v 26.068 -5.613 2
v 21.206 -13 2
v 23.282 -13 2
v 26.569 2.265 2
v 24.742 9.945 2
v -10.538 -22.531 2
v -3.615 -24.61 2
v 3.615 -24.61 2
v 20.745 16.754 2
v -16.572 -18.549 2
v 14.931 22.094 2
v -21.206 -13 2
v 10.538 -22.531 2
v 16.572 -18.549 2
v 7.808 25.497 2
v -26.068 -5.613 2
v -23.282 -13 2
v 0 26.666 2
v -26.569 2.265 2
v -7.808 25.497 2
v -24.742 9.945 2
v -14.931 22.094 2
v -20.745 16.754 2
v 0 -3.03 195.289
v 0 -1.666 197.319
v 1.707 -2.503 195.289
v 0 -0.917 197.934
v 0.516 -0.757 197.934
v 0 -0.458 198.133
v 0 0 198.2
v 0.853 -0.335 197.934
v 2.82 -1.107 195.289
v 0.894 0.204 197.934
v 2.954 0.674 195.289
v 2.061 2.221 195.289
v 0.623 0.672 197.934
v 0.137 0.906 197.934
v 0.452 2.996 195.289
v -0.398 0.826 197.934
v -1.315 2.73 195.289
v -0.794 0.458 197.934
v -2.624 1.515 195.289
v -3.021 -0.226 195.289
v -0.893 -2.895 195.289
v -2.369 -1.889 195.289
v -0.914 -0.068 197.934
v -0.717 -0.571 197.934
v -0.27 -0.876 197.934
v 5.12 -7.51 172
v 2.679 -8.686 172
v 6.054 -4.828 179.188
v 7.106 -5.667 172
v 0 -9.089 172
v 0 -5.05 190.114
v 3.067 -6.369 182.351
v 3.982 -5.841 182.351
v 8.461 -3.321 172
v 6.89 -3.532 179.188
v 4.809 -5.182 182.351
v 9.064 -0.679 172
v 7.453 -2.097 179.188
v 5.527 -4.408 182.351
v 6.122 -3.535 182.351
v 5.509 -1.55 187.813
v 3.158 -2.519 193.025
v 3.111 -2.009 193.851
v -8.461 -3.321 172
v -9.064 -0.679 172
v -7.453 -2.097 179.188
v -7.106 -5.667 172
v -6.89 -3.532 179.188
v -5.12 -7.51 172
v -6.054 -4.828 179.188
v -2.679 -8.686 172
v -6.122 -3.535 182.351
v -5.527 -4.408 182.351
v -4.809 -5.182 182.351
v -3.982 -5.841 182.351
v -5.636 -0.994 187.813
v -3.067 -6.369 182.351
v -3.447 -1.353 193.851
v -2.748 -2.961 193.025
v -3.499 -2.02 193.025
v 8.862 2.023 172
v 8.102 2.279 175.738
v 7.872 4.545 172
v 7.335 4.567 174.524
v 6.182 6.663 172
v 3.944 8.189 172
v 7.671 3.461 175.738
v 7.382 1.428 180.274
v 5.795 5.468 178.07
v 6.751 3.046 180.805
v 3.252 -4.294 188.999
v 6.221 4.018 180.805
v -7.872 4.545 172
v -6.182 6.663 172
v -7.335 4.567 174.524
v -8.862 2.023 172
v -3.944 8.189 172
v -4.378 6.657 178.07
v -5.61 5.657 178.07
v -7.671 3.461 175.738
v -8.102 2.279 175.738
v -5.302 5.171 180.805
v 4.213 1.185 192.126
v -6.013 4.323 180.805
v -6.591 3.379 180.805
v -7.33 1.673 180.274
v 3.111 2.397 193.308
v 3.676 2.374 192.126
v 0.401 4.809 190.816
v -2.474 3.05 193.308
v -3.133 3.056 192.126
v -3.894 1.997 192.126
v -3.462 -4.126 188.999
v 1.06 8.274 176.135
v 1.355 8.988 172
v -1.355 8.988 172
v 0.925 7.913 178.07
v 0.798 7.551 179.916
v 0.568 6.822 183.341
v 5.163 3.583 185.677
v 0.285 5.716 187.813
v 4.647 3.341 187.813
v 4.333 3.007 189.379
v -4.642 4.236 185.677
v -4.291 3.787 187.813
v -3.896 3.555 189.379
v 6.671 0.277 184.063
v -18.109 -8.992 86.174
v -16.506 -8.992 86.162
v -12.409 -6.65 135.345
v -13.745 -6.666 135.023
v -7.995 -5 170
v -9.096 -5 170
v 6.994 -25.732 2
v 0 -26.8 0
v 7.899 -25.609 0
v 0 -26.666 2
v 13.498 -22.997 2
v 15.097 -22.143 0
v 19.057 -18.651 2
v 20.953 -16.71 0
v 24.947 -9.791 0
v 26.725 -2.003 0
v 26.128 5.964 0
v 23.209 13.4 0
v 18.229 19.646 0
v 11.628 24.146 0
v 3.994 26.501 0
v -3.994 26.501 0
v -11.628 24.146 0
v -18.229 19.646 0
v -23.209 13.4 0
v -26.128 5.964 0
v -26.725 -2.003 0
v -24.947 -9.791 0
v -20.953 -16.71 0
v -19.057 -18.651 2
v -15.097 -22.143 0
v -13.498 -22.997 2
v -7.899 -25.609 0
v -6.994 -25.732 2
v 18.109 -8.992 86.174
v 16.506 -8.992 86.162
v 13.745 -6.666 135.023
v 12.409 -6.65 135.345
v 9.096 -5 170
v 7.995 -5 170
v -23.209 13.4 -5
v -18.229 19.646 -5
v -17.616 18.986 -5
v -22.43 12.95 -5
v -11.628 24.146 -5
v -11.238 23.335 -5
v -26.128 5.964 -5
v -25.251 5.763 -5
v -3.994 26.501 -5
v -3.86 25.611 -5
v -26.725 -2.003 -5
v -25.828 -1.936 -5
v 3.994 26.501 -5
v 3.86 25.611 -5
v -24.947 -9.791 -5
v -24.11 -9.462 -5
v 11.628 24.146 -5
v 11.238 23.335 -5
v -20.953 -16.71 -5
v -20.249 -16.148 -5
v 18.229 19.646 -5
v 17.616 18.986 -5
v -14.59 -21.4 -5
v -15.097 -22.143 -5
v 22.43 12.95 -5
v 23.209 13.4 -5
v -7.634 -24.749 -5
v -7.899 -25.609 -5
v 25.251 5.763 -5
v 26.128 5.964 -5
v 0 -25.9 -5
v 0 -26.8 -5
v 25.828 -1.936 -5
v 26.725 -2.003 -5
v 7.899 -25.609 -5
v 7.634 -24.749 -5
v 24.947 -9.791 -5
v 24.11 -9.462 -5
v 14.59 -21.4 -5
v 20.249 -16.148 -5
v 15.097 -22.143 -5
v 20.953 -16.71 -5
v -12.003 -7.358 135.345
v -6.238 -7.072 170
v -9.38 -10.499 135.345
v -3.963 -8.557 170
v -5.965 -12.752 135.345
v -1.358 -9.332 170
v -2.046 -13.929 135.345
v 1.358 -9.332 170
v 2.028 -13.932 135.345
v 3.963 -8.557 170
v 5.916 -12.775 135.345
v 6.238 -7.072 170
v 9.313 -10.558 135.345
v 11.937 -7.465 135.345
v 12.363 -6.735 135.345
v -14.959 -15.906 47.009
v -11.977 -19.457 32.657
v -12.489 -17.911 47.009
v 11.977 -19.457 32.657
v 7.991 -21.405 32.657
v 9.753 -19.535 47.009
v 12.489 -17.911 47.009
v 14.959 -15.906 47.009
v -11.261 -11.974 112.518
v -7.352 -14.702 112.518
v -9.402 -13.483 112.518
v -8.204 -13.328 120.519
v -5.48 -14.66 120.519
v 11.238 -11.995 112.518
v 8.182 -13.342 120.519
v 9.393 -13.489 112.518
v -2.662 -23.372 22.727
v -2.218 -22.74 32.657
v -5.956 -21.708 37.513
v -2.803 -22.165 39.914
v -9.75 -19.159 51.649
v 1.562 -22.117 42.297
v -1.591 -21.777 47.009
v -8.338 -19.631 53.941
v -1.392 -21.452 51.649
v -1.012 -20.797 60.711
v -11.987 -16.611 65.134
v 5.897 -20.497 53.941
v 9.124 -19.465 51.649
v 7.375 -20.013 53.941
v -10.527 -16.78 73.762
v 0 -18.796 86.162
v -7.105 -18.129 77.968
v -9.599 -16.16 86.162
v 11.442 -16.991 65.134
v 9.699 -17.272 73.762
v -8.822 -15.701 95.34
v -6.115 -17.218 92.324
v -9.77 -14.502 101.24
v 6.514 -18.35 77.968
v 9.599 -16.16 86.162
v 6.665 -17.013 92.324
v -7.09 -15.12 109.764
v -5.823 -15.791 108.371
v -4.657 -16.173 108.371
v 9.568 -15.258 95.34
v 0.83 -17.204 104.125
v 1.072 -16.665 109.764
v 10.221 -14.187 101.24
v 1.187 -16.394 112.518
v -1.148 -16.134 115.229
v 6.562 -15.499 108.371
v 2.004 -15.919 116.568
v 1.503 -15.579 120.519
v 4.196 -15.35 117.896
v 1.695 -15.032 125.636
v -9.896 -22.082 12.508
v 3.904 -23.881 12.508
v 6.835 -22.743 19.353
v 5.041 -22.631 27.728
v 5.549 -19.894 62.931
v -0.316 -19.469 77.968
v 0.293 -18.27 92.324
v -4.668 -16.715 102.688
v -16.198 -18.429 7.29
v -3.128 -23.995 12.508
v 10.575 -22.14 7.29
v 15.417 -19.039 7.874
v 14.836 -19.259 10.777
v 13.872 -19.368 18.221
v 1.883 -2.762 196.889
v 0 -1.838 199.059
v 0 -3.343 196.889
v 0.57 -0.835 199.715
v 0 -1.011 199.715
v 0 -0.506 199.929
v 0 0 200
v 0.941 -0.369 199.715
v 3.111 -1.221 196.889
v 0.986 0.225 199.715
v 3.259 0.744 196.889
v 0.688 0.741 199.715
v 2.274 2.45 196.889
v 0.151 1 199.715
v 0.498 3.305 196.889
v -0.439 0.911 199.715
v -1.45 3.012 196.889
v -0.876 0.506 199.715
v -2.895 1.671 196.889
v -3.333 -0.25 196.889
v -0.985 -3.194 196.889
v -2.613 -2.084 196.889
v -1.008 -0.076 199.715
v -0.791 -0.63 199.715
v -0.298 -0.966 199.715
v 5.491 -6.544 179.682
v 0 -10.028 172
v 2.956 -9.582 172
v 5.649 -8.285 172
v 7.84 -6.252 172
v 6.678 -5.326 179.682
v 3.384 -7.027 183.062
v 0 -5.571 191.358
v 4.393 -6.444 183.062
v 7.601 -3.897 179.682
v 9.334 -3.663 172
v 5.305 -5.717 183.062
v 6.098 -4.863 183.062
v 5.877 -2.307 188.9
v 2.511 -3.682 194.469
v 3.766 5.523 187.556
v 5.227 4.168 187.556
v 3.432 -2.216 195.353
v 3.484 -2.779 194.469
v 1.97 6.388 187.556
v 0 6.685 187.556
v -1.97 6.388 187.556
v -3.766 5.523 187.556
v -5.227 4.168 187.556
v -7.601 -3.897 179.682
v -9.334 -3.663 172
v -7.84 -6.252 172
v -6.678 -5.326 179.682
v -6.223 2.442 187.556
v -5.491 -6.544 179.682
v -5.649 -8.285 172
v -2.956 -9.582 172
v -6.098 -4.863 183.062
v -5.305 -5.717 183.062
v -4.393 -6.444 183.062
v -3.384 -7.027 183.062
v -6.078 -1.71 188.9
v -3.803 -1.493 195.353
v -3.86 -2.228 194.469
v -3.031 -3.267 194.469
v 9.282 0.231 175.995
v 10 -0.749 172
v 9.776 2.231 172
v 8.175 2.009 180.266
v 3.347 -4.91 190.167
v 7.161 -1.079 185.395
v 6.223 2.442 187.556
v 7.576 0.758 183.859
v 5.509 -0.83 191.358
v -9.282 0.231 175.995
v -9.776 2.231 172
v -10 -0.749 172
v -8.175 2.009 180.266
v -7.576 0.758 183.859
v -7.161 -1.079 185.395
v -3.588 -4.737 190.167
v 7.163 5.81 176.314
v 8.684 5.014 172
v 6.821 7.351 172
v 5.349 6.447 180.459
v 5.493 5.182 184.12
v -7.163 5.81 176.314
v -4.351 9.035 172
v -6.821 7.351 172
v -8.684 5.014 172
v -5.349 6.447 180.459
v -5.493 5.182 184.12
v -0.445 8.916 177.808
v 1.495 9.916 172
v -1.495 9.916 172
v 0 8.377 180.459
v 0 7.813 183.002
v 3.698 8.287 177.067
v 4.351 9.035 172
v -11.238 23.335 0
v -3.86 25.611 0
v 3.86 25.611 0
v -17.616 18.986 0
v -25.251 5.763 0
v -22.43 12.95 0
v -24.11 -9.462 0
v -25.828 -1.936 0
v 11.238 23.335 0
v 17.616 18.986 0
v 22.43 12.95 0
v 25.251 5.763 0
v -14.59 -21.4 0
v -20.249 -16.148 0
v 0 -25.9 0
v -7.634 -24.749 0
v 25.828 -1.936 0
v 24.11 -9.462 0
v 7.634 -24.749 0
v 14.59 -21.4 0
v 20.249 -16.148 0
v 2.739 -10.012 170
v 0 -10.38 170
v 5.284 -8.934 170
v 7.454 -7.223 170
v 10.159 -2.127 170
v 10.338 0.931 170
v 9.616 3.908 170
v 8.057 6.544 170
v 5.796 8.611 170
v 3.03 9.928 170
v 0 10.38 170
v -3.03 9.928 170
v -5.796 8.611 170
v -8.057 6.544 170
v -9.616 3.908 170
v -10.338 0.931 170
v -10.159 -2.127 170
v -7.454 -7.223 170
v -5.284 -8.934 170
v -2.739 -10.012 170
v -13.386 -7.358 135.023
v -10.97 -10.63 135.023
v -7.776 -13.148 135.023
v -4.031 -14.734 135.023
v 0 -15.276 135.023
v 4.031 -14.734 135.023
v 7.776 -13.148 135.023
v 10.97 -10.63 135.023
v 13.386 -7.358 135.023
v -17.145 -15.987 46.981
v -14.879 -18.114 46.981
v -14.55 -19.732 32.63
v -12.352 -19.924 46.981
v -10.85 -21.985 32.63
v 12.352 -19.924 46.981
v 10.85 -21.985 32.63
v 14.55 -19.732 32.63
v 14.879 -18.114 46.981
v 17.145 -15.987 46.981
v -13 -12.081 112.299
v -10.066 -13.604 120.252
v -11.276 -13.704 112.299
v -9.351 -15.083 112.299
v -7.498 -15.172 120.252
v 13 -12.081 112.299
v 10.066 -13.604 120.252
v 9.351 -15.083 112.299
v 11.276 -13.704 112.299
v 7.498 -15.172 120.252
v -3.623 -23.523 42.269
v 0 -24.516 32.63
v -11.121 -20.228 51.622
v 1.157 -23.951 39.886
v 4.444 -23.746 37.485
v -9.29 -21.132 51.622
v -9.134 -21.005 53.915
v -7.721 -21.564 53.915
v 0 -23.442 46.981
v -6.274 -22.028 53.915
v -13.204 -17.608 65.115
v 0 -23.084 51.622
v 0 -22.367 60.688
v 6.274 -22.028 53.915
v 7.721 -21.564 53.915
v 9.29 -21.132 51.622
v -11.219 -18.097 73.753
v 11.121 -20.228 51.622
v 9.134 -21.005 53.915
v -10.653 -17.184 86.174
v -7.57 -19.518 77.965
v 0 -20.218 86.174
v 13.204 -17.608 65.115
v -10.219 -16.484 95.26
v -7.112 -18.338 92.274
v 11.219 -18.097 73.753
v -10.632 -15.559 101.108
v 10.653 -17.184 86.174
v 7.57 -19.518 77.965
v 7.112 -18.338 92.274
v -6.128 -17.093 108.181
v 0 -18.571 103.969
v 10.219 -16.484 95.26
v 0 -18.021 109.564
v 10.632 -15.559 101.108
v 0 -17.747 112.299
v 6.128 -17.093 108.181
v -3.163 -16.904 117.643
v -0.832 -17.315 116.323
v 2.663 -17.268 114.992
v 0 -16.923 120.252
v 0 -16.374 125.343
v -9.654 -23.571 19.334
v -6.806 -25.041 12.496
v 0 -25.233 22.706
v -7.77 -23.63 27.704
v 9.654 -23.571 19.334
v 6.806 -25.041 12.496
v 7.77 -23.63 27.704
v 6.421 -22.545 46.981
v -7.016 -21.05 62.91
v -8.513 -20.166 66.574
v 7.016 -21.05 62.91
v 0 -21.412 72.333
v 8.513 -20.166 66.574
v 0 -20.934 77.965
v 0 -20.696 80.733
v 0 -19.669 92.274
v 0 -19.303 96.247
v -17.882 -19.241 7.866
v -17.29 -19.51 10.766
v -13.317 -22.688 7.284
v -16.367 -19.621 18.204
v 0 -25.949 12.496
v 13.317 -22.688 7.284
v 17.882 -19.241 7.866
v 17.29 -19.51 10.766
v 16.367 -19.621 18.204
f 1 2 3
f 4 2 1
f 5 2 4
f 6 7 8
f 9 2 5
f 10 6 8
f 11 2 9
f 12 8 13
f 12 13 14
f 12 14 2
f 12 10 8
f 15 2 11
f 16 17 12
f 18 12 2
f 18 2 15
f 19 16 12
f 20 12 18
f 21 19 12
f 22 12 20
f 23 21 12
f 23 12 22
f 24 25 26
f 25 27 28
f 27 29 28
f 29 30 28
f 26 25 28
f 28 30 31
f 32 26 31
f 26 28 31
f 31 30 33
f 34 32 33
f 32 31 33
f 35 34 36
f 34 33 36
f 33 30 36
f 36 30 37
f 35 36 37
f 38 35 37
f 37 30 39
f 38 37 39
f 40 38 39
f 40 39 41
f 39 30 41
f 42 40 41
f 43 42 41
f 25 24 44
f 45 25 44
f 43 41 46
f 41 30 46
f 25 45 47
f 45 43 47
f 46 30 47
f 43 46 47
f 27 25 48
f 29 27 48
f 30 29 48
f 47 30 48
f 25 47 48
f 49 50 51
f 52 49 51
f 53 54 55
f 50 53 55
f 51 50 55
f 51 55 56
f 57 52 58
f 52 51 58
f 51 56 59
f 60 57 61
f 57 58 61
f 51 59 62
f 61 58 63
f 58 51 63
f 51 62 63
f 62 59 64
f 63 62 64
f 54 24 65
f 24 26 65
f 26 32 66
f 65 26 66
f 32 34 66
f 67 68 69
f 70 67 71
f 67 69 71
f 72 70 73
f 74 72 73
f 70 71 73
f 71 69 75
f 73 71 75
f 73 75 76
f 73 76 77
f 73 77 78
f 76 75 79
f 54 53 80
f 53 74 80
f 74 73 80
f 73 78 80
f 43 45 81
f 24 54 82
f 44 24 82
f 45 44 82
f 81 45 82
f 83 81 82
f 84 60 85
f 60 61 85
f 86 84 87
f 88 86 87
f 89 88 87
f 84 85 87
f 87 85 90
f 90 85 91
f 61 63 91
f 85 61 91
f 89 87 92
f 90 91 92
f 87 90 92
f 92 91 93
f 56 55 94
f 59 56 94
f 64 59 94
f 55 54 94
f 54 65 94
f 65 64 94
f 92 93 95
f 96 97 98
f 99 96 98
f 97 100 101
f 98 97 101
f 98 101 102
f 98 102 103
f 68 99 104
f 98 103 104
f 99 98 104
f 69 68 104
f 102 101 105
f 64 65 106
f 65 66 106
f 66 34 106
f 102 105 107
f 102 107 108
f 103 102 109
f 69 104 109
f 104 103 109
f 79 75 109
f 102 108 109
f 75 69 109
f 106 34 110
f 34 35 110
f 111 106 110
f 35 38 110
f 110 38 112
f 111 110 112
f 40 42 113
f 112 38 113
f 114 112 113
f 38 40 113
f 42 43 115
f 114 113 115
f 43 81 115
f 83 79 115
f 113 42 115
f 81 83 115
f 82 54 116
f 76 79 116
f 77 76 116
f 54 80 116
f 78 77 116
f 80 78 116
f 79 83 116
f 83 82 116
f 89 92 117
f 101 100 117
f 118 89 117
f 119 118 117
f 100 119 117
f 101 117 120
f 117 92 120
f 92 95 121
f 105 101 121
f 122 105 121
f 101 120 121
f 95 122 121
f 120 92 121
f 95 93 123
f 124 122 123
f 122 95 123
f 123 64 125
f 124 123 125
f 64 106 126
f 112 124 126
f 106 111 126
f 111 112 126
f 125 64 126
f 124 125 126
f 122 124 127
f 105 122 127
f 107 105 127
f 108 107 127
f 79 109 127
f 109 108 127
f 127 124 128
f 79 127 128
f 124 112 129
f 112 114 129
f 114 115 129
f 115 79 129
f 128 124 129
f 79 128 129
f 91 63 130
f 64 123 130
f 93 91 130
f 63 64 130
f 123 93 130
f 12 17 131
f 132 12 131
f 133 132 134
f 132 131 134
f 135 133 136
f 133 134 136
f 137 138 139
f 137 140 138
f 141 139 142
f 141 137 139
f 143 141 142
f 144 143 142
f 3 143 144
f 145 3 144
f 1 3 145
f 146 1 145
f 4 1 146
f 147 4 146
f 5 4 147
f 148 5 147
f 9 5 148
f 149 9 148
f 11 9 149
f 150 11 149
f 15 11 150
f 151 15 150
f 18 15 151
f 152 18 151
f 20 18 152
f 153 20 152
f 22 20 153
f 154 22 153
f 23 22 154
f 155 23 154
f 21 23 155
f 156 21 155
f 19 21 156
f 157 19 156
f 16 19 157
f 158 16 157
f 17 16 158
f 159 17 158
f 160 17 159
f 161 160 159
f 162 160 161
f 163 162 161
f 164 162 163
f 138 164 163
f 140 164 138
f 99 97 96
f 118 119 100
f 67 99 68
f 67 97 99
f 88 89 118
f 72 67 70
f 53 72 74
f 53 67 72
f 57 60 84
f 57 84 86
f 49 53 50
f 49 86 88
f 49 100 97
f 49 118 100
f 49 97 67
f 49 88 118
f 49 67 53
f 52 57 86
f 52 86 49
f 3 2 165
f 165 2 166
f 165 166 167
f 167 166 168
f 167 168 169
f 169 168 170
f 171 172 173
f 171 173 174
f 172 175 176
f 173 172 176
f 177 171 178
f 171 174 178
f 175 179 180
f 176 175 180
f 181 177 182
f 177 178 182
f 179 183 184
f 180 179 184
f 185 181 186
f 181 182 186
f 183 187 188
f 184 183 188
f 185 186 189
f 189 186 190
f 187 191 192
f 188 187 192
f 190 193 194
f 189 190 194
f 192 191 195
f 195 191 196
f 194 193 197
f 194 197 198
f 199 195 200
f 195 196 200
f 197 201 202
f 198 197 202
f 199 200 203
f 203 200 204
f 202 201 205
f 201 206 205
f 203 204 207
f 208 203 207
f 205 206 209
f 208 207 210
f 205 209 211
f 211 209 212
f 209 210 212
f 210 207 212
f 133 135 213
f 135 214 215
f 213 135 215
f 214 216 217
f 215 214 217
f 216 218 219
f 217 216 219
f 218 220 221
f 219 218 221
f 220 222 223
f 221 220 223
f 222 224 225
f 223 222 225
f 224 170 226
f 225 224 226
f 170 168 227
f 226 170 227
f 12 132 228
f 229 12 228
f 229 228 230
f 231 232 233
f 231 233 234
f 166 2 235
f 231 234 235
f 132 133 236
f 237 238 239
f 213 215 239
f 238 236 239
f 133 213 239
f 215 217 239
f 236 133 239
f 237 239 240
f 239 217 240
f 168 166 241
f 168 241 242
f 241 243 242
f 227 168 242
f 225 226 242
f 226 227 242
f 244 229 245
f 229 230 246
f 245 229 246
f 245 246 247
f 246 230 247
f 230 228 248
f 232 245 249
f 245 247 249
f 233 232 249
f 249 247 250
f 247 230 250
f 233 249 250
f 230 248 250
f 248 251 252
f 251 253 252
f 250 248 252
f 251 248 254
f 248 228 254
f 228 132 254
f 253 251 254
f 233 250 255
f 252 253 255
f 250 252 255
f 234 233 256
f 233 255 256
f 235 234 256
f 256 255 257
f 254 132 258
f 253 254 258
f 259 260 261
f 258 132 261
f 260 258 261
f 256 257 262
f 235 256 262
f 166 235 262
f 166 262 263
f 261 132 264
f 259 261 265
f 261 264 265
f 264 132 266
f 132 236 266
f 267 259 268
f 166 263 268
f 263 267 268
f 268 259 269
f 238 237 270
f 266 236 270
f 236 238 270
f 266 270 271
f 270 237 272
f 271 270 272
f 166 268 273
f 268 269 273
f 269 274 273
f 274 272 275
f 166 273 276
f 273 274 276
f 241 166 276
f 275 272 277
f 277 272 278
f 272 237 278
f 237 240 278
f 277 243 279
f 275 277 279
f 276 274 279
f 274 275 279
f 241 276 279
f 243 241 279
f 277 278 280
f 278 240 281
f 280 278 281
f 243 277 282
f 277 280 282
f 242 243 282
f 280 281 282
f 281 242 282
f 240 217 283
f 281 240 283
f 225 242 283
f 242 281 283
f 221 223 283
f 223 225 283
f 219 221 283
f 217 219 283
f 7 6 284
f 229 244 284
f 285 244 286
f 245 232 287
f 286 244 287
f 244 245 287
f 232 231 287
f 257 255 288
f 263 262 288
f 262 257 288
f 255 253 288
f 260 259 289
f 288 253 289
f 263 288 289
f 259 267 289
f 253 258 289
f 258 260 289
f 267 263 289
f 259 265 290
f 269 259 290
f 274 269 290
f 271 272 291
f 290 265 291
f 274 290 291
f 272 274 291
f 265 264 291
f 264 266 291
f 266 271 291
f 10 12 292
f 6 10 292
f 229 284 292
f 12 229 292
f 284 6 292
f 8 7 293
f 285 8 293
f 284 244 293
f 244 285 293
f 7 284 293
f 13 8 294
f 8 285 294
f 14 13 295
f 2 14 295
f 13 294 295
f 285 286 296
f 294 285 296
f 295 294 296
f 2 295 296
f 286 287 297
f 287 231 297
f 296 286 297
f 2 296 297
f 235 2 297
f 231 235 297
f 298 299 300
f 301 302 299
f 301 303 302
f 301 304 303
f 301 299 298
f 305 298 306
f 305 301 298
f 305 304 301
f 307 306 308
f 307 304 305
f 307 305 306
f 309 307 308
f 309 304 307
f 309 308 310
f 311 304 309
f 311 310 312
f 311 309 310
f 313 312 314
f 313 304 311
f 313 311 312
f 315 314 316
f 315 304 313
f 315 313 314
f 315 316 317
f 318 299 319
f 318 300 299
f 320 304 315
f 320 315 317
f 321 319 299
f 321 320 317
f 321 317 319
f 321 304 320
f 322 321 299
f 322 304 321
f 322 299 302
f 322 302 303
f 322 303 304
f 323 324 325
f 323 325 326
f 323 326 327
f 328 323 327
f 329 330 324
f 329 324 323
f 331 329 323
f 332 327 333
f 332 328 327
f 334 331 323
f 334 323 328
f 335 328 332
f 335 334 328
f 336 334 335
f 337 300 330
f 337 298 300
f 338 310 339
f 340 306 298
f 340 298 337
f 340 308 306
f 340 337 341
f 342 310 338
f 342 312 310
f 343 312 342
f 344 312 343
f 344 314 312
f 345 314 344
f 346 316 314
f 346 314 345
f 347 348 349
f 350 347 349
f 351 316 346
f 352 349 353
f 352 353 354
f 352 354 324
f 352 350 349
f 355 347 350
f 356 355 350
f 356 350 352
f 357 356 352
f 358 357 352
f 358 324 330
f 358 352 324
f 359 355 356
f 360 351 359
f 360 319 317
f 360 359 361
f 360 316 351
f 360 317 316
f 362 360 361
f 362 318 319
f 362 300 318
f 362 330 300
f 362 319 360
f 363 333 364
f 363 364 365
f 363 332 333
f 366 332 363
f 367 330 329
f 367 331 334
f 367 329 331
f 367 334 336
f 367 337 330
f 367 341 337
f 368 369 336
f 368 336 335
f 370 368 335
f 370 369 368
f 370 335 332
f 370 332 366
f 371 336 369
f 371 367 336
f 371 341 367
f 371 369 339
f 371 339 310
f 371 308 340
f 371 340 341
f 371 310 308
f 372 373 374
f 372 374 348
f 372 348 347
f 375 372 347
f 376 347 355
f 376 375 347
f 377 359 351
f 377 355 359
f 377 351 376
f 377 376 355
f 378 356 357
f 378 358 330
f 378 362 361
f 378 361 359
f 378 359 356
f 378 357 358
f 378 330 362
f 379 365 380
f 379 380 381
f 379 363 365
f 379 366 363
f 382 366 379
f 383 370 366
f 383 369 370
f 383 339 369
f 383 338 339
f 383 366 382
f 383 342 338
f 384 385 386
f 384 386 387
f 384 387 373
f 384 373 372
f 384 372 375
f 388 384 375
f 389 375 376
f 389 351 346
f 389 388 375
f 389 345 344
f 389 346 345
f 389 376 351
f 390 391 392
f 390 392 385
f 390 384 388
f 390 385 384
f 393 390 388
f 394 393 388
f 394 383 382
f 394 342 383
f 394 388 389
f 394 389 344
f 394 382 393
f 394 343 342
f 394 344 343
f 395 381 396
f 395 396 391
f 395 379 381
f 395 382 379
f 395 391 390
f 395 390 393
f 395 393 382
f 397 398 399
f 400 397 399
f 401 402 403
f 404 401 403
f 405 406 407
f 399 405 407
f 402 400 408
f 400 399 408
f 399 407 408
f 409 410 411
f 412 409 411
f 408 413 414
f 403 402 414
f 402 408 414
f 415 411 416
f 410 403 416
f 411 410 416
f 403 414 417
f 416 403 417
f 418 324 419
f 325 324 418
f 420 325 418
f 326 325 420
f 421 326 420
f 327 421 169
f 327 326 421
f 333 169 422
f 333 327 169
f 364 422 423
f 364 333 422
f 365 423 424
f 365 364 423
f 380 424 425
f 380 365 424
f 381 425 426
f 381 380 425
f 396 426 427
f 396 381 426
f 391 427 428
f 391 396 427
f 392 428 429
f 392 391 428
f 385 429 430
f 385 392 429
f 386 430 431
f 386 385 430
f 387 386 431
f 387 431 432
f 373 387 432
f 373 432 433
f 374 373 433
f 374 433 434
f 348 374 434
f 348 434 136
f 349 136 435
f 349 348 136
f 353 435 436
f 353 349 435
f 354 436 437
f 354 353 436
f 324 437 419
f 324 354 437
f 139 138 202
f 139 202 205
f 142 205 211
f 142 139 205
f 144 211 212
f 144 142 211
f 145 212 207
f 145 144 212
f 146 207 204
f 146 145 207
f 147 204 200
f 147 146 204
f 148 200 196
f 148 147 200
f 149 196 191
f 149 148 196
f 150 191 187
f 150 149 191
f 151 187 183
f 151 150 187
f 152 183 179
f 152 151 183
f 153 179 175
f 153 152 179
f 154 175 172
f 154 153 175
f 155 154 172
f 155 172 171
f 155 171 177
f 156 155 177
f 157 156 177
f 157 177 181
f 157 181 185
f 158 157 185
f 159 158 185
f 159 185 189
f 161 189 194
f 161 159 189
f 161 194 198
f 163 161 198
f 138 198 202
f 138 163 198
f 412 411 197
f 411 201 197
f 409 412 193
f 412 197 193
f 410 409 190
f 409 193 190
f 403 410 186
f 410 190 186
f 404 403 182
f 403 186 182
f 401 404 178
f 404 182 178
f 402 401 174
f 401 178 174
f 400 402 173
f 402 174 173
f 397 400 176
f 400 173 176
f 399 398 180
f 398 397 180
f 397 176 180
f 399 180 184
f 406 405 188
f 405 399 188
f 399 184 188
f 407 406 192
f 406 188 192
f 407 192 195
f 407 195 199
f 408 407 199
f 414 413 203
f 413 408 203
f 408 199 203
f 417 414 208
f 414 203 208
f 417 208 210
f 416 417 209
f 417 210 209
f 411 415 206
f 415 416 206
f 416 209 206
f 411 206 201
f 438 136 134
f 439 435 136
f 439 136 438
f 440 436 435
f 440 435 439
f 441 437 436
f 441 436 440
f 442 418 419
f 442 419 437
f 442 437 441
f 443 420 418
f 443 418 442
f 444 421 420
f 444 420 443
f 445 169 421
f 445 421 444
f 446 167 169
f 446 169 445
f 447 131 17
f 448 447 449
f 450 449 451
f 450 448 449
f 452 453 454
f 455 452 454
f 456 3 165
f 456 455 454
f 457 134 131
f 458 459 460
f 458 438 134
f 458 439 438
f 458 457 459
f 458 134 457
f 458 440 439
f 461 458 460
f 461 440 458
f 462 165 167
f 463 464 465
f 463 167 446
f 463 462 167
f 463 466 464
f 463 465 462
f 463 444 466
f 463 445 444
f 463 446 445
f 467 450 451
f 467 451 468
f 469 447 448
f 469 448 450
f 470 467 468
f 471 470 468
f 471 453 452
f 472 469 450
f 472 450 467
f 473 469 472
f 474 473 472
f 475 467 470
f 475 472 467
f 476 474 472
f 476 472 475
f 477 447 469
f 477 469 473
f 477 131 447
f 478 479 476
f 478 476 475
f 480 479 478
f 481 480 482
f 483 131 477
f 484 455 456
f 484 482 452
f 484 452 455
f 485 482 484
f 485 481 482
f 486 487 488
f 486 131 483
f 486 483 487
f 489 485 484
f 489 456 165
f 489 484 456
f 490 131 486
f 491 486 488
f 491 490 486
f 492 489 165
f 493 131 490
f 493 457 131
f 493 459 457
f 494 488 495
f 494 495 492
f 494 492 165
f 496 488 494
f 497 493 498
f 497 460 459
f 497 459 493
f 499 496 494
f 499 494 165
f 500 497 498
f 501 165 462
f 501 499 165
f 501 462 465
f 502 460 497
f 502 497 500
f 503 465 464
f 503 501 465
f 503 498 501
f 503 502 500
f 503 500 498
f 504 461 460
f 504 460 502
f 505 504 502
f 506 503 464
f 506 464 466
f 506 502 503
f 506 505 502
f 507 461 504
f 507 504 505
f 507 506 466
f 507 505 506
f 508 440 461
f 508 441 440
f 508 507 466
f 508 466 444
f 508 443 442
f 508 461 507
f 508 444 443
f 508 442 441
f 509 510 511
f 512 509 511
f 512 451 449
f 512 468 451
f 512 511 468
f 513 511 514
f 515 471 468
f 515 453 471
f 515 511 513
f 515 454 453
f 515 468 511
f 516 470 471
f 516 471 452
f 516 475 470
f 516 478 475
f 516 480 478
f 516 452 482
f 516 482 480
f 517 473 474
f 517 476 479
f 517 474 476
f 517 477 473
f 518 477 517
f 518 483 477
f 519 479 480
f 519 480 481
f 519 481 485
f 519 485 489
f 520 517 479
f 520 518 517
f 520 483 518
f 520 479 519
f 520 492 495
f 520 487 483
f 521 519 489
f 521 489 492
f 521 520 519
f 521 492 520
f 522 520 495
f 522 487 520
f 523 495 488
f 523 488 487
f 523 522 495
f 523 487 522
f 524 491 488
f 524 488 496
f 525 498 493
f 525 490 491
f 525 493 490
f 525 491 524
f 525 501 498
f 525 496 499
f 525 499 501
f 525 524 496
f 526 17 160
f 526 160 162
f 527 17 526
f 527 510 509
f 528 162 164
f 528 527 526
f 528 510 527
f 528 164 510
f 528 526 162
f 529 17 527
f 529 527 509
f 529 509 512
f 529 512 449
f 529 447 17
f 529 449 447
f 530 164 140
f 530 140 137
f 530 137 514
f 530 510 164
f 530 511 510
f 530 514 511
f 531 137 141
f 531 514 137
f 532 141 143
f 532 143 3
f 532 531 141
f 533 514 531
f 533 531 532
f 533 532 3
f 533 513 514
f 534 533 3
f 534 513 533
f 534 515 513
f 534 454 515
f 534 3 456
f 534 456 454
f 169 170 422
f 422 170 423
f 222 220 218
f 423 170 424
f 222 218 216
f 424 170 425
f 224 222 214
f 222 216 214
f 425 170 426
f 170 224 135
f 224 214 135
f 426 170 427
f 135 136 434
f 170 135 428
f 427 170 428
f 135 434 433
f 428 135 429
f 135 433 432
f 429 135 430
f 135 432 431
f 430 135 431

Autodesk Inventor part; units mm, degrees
ref_plane "YZ Plane" through (0, 0, 0) normal (1, 0, 0) x (0, 1, 0)
ref_plane "XZ Plane" through (0, 0, 0) normal (0, 1, 0) x (-1, 0, 0)
ref_plane "XY Plane" through (0, 0, 0) normal (0, 0, 1) x (1, 0, 0)
sketch "Sketch2" plane through (0, 0, 0) normal (1, 0, 0) x (0, 1, 0)
  line L0 (0, 0) -> (25.9, 0)
  line L1 (25.9, 0) -> (25.9, -5)
  line L2 (25.9, -5) -> (26.8, -5)
  line L3 (26.8, -5) -> (26.8, 0)
  line L4 (0, 2) -> (25, 2)
  line L5 (0, 0) -> (-25.9, 0)
  line L6 (-25.9, 0) -> (-25.9, -5)
  line L7 (-25.9, -5) -> (-26.8, -5)
  line L8 (-26.8, -5) -> (-26.8, 0)
  line L9 (0, 2) -> (-25, 2)
  line L10 (0, 0) -> (0, 170)
  line L11 (0, 0) -> (0, 200)
  line L12 (25, 2) -> (25, 0)
  line L13 (-25, 2) -> (-25, 0)
  line L14 (0, 0) -> (0, 198.2)
  spline S0 degree 2 poles (26.8, 0) (0, 400) (-26.8, 0) knots 0 0 0 1 1 1
  spline S1 degree 2 poles (25, 0) (0, 396.4) (-25, 0) knots 0 0 0 1 1 1
  line L15 (0, 170) -> (10.3796, 170)
  line L16 (0, 2) -> (-5, 2)
  line L17 (0, 172) -> (0, 2)
  line L18 (0, 172) -> (10.0276, 172)
  line L19 (0, 0) -> (-5, 0)
  line L20 (-5, 0) -> (-5, 170)
  line L21 (-5, 170) -> (0, 170)
  line L22 (0, 170) -> (0, 0)
  line L23 (-5, 2) -> (-13, 2)
  line L24 (-13, 2) -> (-5, 170)
  line L25 (25, 2) -> (26.6657, 2)
  line L26 (-25, 2) -> (-26.6657, 2)
  line L27 (0, -46.4) -> (0, 243.4) projected
  point P0 (24.8735, 2)
  point P1 (9.0895, 172)
  point P2 (9.43, 170)
  dimension "d51" = 25.9
  dimension "d52" = 5
  dimension "d53" = 0.9
  dimension "d54" = 2
  dimension "d55" = 25.9
  dimension "d56" = 5
  dimension "d57" = 0.9
  dimension "d58" = 170
  dimension "d59" = 200
  dimension "d60" = 25
  dimension "d61" = 25
  dimension "d62" = 198.2
  dimension "d64" = 25
  dimension "d67" = 2
  dimension "d68" = 170
  dimension "d69" = 5
  dimension "d70" = 8
  dimension "d71" = 170
  dimension "d72" = 87.274
revolve "Revolution5" add sketch "Sketch2" angle 360 mid plane about axis through (0, 0, -10) along (0, 0, 1) contours L10 L4 S1 L0 | L12 L25 S0 L3 L2 L1 L0 | S1 L4 L12 | L4 S1 L15 S0 L25 | L11 L18 S1 L15 | S1 L18 S0 L15 | S1 L11 S0 L18
extrude "Extrusion4" cut sketch "Sketch2" along normal mid plane 60 contours L10 L15 S1 L4 | L9 L20 L21 L10 | L4 S1 L15 S0 L25 | L9 L24 L20
properties part number "nose-basepart1"
